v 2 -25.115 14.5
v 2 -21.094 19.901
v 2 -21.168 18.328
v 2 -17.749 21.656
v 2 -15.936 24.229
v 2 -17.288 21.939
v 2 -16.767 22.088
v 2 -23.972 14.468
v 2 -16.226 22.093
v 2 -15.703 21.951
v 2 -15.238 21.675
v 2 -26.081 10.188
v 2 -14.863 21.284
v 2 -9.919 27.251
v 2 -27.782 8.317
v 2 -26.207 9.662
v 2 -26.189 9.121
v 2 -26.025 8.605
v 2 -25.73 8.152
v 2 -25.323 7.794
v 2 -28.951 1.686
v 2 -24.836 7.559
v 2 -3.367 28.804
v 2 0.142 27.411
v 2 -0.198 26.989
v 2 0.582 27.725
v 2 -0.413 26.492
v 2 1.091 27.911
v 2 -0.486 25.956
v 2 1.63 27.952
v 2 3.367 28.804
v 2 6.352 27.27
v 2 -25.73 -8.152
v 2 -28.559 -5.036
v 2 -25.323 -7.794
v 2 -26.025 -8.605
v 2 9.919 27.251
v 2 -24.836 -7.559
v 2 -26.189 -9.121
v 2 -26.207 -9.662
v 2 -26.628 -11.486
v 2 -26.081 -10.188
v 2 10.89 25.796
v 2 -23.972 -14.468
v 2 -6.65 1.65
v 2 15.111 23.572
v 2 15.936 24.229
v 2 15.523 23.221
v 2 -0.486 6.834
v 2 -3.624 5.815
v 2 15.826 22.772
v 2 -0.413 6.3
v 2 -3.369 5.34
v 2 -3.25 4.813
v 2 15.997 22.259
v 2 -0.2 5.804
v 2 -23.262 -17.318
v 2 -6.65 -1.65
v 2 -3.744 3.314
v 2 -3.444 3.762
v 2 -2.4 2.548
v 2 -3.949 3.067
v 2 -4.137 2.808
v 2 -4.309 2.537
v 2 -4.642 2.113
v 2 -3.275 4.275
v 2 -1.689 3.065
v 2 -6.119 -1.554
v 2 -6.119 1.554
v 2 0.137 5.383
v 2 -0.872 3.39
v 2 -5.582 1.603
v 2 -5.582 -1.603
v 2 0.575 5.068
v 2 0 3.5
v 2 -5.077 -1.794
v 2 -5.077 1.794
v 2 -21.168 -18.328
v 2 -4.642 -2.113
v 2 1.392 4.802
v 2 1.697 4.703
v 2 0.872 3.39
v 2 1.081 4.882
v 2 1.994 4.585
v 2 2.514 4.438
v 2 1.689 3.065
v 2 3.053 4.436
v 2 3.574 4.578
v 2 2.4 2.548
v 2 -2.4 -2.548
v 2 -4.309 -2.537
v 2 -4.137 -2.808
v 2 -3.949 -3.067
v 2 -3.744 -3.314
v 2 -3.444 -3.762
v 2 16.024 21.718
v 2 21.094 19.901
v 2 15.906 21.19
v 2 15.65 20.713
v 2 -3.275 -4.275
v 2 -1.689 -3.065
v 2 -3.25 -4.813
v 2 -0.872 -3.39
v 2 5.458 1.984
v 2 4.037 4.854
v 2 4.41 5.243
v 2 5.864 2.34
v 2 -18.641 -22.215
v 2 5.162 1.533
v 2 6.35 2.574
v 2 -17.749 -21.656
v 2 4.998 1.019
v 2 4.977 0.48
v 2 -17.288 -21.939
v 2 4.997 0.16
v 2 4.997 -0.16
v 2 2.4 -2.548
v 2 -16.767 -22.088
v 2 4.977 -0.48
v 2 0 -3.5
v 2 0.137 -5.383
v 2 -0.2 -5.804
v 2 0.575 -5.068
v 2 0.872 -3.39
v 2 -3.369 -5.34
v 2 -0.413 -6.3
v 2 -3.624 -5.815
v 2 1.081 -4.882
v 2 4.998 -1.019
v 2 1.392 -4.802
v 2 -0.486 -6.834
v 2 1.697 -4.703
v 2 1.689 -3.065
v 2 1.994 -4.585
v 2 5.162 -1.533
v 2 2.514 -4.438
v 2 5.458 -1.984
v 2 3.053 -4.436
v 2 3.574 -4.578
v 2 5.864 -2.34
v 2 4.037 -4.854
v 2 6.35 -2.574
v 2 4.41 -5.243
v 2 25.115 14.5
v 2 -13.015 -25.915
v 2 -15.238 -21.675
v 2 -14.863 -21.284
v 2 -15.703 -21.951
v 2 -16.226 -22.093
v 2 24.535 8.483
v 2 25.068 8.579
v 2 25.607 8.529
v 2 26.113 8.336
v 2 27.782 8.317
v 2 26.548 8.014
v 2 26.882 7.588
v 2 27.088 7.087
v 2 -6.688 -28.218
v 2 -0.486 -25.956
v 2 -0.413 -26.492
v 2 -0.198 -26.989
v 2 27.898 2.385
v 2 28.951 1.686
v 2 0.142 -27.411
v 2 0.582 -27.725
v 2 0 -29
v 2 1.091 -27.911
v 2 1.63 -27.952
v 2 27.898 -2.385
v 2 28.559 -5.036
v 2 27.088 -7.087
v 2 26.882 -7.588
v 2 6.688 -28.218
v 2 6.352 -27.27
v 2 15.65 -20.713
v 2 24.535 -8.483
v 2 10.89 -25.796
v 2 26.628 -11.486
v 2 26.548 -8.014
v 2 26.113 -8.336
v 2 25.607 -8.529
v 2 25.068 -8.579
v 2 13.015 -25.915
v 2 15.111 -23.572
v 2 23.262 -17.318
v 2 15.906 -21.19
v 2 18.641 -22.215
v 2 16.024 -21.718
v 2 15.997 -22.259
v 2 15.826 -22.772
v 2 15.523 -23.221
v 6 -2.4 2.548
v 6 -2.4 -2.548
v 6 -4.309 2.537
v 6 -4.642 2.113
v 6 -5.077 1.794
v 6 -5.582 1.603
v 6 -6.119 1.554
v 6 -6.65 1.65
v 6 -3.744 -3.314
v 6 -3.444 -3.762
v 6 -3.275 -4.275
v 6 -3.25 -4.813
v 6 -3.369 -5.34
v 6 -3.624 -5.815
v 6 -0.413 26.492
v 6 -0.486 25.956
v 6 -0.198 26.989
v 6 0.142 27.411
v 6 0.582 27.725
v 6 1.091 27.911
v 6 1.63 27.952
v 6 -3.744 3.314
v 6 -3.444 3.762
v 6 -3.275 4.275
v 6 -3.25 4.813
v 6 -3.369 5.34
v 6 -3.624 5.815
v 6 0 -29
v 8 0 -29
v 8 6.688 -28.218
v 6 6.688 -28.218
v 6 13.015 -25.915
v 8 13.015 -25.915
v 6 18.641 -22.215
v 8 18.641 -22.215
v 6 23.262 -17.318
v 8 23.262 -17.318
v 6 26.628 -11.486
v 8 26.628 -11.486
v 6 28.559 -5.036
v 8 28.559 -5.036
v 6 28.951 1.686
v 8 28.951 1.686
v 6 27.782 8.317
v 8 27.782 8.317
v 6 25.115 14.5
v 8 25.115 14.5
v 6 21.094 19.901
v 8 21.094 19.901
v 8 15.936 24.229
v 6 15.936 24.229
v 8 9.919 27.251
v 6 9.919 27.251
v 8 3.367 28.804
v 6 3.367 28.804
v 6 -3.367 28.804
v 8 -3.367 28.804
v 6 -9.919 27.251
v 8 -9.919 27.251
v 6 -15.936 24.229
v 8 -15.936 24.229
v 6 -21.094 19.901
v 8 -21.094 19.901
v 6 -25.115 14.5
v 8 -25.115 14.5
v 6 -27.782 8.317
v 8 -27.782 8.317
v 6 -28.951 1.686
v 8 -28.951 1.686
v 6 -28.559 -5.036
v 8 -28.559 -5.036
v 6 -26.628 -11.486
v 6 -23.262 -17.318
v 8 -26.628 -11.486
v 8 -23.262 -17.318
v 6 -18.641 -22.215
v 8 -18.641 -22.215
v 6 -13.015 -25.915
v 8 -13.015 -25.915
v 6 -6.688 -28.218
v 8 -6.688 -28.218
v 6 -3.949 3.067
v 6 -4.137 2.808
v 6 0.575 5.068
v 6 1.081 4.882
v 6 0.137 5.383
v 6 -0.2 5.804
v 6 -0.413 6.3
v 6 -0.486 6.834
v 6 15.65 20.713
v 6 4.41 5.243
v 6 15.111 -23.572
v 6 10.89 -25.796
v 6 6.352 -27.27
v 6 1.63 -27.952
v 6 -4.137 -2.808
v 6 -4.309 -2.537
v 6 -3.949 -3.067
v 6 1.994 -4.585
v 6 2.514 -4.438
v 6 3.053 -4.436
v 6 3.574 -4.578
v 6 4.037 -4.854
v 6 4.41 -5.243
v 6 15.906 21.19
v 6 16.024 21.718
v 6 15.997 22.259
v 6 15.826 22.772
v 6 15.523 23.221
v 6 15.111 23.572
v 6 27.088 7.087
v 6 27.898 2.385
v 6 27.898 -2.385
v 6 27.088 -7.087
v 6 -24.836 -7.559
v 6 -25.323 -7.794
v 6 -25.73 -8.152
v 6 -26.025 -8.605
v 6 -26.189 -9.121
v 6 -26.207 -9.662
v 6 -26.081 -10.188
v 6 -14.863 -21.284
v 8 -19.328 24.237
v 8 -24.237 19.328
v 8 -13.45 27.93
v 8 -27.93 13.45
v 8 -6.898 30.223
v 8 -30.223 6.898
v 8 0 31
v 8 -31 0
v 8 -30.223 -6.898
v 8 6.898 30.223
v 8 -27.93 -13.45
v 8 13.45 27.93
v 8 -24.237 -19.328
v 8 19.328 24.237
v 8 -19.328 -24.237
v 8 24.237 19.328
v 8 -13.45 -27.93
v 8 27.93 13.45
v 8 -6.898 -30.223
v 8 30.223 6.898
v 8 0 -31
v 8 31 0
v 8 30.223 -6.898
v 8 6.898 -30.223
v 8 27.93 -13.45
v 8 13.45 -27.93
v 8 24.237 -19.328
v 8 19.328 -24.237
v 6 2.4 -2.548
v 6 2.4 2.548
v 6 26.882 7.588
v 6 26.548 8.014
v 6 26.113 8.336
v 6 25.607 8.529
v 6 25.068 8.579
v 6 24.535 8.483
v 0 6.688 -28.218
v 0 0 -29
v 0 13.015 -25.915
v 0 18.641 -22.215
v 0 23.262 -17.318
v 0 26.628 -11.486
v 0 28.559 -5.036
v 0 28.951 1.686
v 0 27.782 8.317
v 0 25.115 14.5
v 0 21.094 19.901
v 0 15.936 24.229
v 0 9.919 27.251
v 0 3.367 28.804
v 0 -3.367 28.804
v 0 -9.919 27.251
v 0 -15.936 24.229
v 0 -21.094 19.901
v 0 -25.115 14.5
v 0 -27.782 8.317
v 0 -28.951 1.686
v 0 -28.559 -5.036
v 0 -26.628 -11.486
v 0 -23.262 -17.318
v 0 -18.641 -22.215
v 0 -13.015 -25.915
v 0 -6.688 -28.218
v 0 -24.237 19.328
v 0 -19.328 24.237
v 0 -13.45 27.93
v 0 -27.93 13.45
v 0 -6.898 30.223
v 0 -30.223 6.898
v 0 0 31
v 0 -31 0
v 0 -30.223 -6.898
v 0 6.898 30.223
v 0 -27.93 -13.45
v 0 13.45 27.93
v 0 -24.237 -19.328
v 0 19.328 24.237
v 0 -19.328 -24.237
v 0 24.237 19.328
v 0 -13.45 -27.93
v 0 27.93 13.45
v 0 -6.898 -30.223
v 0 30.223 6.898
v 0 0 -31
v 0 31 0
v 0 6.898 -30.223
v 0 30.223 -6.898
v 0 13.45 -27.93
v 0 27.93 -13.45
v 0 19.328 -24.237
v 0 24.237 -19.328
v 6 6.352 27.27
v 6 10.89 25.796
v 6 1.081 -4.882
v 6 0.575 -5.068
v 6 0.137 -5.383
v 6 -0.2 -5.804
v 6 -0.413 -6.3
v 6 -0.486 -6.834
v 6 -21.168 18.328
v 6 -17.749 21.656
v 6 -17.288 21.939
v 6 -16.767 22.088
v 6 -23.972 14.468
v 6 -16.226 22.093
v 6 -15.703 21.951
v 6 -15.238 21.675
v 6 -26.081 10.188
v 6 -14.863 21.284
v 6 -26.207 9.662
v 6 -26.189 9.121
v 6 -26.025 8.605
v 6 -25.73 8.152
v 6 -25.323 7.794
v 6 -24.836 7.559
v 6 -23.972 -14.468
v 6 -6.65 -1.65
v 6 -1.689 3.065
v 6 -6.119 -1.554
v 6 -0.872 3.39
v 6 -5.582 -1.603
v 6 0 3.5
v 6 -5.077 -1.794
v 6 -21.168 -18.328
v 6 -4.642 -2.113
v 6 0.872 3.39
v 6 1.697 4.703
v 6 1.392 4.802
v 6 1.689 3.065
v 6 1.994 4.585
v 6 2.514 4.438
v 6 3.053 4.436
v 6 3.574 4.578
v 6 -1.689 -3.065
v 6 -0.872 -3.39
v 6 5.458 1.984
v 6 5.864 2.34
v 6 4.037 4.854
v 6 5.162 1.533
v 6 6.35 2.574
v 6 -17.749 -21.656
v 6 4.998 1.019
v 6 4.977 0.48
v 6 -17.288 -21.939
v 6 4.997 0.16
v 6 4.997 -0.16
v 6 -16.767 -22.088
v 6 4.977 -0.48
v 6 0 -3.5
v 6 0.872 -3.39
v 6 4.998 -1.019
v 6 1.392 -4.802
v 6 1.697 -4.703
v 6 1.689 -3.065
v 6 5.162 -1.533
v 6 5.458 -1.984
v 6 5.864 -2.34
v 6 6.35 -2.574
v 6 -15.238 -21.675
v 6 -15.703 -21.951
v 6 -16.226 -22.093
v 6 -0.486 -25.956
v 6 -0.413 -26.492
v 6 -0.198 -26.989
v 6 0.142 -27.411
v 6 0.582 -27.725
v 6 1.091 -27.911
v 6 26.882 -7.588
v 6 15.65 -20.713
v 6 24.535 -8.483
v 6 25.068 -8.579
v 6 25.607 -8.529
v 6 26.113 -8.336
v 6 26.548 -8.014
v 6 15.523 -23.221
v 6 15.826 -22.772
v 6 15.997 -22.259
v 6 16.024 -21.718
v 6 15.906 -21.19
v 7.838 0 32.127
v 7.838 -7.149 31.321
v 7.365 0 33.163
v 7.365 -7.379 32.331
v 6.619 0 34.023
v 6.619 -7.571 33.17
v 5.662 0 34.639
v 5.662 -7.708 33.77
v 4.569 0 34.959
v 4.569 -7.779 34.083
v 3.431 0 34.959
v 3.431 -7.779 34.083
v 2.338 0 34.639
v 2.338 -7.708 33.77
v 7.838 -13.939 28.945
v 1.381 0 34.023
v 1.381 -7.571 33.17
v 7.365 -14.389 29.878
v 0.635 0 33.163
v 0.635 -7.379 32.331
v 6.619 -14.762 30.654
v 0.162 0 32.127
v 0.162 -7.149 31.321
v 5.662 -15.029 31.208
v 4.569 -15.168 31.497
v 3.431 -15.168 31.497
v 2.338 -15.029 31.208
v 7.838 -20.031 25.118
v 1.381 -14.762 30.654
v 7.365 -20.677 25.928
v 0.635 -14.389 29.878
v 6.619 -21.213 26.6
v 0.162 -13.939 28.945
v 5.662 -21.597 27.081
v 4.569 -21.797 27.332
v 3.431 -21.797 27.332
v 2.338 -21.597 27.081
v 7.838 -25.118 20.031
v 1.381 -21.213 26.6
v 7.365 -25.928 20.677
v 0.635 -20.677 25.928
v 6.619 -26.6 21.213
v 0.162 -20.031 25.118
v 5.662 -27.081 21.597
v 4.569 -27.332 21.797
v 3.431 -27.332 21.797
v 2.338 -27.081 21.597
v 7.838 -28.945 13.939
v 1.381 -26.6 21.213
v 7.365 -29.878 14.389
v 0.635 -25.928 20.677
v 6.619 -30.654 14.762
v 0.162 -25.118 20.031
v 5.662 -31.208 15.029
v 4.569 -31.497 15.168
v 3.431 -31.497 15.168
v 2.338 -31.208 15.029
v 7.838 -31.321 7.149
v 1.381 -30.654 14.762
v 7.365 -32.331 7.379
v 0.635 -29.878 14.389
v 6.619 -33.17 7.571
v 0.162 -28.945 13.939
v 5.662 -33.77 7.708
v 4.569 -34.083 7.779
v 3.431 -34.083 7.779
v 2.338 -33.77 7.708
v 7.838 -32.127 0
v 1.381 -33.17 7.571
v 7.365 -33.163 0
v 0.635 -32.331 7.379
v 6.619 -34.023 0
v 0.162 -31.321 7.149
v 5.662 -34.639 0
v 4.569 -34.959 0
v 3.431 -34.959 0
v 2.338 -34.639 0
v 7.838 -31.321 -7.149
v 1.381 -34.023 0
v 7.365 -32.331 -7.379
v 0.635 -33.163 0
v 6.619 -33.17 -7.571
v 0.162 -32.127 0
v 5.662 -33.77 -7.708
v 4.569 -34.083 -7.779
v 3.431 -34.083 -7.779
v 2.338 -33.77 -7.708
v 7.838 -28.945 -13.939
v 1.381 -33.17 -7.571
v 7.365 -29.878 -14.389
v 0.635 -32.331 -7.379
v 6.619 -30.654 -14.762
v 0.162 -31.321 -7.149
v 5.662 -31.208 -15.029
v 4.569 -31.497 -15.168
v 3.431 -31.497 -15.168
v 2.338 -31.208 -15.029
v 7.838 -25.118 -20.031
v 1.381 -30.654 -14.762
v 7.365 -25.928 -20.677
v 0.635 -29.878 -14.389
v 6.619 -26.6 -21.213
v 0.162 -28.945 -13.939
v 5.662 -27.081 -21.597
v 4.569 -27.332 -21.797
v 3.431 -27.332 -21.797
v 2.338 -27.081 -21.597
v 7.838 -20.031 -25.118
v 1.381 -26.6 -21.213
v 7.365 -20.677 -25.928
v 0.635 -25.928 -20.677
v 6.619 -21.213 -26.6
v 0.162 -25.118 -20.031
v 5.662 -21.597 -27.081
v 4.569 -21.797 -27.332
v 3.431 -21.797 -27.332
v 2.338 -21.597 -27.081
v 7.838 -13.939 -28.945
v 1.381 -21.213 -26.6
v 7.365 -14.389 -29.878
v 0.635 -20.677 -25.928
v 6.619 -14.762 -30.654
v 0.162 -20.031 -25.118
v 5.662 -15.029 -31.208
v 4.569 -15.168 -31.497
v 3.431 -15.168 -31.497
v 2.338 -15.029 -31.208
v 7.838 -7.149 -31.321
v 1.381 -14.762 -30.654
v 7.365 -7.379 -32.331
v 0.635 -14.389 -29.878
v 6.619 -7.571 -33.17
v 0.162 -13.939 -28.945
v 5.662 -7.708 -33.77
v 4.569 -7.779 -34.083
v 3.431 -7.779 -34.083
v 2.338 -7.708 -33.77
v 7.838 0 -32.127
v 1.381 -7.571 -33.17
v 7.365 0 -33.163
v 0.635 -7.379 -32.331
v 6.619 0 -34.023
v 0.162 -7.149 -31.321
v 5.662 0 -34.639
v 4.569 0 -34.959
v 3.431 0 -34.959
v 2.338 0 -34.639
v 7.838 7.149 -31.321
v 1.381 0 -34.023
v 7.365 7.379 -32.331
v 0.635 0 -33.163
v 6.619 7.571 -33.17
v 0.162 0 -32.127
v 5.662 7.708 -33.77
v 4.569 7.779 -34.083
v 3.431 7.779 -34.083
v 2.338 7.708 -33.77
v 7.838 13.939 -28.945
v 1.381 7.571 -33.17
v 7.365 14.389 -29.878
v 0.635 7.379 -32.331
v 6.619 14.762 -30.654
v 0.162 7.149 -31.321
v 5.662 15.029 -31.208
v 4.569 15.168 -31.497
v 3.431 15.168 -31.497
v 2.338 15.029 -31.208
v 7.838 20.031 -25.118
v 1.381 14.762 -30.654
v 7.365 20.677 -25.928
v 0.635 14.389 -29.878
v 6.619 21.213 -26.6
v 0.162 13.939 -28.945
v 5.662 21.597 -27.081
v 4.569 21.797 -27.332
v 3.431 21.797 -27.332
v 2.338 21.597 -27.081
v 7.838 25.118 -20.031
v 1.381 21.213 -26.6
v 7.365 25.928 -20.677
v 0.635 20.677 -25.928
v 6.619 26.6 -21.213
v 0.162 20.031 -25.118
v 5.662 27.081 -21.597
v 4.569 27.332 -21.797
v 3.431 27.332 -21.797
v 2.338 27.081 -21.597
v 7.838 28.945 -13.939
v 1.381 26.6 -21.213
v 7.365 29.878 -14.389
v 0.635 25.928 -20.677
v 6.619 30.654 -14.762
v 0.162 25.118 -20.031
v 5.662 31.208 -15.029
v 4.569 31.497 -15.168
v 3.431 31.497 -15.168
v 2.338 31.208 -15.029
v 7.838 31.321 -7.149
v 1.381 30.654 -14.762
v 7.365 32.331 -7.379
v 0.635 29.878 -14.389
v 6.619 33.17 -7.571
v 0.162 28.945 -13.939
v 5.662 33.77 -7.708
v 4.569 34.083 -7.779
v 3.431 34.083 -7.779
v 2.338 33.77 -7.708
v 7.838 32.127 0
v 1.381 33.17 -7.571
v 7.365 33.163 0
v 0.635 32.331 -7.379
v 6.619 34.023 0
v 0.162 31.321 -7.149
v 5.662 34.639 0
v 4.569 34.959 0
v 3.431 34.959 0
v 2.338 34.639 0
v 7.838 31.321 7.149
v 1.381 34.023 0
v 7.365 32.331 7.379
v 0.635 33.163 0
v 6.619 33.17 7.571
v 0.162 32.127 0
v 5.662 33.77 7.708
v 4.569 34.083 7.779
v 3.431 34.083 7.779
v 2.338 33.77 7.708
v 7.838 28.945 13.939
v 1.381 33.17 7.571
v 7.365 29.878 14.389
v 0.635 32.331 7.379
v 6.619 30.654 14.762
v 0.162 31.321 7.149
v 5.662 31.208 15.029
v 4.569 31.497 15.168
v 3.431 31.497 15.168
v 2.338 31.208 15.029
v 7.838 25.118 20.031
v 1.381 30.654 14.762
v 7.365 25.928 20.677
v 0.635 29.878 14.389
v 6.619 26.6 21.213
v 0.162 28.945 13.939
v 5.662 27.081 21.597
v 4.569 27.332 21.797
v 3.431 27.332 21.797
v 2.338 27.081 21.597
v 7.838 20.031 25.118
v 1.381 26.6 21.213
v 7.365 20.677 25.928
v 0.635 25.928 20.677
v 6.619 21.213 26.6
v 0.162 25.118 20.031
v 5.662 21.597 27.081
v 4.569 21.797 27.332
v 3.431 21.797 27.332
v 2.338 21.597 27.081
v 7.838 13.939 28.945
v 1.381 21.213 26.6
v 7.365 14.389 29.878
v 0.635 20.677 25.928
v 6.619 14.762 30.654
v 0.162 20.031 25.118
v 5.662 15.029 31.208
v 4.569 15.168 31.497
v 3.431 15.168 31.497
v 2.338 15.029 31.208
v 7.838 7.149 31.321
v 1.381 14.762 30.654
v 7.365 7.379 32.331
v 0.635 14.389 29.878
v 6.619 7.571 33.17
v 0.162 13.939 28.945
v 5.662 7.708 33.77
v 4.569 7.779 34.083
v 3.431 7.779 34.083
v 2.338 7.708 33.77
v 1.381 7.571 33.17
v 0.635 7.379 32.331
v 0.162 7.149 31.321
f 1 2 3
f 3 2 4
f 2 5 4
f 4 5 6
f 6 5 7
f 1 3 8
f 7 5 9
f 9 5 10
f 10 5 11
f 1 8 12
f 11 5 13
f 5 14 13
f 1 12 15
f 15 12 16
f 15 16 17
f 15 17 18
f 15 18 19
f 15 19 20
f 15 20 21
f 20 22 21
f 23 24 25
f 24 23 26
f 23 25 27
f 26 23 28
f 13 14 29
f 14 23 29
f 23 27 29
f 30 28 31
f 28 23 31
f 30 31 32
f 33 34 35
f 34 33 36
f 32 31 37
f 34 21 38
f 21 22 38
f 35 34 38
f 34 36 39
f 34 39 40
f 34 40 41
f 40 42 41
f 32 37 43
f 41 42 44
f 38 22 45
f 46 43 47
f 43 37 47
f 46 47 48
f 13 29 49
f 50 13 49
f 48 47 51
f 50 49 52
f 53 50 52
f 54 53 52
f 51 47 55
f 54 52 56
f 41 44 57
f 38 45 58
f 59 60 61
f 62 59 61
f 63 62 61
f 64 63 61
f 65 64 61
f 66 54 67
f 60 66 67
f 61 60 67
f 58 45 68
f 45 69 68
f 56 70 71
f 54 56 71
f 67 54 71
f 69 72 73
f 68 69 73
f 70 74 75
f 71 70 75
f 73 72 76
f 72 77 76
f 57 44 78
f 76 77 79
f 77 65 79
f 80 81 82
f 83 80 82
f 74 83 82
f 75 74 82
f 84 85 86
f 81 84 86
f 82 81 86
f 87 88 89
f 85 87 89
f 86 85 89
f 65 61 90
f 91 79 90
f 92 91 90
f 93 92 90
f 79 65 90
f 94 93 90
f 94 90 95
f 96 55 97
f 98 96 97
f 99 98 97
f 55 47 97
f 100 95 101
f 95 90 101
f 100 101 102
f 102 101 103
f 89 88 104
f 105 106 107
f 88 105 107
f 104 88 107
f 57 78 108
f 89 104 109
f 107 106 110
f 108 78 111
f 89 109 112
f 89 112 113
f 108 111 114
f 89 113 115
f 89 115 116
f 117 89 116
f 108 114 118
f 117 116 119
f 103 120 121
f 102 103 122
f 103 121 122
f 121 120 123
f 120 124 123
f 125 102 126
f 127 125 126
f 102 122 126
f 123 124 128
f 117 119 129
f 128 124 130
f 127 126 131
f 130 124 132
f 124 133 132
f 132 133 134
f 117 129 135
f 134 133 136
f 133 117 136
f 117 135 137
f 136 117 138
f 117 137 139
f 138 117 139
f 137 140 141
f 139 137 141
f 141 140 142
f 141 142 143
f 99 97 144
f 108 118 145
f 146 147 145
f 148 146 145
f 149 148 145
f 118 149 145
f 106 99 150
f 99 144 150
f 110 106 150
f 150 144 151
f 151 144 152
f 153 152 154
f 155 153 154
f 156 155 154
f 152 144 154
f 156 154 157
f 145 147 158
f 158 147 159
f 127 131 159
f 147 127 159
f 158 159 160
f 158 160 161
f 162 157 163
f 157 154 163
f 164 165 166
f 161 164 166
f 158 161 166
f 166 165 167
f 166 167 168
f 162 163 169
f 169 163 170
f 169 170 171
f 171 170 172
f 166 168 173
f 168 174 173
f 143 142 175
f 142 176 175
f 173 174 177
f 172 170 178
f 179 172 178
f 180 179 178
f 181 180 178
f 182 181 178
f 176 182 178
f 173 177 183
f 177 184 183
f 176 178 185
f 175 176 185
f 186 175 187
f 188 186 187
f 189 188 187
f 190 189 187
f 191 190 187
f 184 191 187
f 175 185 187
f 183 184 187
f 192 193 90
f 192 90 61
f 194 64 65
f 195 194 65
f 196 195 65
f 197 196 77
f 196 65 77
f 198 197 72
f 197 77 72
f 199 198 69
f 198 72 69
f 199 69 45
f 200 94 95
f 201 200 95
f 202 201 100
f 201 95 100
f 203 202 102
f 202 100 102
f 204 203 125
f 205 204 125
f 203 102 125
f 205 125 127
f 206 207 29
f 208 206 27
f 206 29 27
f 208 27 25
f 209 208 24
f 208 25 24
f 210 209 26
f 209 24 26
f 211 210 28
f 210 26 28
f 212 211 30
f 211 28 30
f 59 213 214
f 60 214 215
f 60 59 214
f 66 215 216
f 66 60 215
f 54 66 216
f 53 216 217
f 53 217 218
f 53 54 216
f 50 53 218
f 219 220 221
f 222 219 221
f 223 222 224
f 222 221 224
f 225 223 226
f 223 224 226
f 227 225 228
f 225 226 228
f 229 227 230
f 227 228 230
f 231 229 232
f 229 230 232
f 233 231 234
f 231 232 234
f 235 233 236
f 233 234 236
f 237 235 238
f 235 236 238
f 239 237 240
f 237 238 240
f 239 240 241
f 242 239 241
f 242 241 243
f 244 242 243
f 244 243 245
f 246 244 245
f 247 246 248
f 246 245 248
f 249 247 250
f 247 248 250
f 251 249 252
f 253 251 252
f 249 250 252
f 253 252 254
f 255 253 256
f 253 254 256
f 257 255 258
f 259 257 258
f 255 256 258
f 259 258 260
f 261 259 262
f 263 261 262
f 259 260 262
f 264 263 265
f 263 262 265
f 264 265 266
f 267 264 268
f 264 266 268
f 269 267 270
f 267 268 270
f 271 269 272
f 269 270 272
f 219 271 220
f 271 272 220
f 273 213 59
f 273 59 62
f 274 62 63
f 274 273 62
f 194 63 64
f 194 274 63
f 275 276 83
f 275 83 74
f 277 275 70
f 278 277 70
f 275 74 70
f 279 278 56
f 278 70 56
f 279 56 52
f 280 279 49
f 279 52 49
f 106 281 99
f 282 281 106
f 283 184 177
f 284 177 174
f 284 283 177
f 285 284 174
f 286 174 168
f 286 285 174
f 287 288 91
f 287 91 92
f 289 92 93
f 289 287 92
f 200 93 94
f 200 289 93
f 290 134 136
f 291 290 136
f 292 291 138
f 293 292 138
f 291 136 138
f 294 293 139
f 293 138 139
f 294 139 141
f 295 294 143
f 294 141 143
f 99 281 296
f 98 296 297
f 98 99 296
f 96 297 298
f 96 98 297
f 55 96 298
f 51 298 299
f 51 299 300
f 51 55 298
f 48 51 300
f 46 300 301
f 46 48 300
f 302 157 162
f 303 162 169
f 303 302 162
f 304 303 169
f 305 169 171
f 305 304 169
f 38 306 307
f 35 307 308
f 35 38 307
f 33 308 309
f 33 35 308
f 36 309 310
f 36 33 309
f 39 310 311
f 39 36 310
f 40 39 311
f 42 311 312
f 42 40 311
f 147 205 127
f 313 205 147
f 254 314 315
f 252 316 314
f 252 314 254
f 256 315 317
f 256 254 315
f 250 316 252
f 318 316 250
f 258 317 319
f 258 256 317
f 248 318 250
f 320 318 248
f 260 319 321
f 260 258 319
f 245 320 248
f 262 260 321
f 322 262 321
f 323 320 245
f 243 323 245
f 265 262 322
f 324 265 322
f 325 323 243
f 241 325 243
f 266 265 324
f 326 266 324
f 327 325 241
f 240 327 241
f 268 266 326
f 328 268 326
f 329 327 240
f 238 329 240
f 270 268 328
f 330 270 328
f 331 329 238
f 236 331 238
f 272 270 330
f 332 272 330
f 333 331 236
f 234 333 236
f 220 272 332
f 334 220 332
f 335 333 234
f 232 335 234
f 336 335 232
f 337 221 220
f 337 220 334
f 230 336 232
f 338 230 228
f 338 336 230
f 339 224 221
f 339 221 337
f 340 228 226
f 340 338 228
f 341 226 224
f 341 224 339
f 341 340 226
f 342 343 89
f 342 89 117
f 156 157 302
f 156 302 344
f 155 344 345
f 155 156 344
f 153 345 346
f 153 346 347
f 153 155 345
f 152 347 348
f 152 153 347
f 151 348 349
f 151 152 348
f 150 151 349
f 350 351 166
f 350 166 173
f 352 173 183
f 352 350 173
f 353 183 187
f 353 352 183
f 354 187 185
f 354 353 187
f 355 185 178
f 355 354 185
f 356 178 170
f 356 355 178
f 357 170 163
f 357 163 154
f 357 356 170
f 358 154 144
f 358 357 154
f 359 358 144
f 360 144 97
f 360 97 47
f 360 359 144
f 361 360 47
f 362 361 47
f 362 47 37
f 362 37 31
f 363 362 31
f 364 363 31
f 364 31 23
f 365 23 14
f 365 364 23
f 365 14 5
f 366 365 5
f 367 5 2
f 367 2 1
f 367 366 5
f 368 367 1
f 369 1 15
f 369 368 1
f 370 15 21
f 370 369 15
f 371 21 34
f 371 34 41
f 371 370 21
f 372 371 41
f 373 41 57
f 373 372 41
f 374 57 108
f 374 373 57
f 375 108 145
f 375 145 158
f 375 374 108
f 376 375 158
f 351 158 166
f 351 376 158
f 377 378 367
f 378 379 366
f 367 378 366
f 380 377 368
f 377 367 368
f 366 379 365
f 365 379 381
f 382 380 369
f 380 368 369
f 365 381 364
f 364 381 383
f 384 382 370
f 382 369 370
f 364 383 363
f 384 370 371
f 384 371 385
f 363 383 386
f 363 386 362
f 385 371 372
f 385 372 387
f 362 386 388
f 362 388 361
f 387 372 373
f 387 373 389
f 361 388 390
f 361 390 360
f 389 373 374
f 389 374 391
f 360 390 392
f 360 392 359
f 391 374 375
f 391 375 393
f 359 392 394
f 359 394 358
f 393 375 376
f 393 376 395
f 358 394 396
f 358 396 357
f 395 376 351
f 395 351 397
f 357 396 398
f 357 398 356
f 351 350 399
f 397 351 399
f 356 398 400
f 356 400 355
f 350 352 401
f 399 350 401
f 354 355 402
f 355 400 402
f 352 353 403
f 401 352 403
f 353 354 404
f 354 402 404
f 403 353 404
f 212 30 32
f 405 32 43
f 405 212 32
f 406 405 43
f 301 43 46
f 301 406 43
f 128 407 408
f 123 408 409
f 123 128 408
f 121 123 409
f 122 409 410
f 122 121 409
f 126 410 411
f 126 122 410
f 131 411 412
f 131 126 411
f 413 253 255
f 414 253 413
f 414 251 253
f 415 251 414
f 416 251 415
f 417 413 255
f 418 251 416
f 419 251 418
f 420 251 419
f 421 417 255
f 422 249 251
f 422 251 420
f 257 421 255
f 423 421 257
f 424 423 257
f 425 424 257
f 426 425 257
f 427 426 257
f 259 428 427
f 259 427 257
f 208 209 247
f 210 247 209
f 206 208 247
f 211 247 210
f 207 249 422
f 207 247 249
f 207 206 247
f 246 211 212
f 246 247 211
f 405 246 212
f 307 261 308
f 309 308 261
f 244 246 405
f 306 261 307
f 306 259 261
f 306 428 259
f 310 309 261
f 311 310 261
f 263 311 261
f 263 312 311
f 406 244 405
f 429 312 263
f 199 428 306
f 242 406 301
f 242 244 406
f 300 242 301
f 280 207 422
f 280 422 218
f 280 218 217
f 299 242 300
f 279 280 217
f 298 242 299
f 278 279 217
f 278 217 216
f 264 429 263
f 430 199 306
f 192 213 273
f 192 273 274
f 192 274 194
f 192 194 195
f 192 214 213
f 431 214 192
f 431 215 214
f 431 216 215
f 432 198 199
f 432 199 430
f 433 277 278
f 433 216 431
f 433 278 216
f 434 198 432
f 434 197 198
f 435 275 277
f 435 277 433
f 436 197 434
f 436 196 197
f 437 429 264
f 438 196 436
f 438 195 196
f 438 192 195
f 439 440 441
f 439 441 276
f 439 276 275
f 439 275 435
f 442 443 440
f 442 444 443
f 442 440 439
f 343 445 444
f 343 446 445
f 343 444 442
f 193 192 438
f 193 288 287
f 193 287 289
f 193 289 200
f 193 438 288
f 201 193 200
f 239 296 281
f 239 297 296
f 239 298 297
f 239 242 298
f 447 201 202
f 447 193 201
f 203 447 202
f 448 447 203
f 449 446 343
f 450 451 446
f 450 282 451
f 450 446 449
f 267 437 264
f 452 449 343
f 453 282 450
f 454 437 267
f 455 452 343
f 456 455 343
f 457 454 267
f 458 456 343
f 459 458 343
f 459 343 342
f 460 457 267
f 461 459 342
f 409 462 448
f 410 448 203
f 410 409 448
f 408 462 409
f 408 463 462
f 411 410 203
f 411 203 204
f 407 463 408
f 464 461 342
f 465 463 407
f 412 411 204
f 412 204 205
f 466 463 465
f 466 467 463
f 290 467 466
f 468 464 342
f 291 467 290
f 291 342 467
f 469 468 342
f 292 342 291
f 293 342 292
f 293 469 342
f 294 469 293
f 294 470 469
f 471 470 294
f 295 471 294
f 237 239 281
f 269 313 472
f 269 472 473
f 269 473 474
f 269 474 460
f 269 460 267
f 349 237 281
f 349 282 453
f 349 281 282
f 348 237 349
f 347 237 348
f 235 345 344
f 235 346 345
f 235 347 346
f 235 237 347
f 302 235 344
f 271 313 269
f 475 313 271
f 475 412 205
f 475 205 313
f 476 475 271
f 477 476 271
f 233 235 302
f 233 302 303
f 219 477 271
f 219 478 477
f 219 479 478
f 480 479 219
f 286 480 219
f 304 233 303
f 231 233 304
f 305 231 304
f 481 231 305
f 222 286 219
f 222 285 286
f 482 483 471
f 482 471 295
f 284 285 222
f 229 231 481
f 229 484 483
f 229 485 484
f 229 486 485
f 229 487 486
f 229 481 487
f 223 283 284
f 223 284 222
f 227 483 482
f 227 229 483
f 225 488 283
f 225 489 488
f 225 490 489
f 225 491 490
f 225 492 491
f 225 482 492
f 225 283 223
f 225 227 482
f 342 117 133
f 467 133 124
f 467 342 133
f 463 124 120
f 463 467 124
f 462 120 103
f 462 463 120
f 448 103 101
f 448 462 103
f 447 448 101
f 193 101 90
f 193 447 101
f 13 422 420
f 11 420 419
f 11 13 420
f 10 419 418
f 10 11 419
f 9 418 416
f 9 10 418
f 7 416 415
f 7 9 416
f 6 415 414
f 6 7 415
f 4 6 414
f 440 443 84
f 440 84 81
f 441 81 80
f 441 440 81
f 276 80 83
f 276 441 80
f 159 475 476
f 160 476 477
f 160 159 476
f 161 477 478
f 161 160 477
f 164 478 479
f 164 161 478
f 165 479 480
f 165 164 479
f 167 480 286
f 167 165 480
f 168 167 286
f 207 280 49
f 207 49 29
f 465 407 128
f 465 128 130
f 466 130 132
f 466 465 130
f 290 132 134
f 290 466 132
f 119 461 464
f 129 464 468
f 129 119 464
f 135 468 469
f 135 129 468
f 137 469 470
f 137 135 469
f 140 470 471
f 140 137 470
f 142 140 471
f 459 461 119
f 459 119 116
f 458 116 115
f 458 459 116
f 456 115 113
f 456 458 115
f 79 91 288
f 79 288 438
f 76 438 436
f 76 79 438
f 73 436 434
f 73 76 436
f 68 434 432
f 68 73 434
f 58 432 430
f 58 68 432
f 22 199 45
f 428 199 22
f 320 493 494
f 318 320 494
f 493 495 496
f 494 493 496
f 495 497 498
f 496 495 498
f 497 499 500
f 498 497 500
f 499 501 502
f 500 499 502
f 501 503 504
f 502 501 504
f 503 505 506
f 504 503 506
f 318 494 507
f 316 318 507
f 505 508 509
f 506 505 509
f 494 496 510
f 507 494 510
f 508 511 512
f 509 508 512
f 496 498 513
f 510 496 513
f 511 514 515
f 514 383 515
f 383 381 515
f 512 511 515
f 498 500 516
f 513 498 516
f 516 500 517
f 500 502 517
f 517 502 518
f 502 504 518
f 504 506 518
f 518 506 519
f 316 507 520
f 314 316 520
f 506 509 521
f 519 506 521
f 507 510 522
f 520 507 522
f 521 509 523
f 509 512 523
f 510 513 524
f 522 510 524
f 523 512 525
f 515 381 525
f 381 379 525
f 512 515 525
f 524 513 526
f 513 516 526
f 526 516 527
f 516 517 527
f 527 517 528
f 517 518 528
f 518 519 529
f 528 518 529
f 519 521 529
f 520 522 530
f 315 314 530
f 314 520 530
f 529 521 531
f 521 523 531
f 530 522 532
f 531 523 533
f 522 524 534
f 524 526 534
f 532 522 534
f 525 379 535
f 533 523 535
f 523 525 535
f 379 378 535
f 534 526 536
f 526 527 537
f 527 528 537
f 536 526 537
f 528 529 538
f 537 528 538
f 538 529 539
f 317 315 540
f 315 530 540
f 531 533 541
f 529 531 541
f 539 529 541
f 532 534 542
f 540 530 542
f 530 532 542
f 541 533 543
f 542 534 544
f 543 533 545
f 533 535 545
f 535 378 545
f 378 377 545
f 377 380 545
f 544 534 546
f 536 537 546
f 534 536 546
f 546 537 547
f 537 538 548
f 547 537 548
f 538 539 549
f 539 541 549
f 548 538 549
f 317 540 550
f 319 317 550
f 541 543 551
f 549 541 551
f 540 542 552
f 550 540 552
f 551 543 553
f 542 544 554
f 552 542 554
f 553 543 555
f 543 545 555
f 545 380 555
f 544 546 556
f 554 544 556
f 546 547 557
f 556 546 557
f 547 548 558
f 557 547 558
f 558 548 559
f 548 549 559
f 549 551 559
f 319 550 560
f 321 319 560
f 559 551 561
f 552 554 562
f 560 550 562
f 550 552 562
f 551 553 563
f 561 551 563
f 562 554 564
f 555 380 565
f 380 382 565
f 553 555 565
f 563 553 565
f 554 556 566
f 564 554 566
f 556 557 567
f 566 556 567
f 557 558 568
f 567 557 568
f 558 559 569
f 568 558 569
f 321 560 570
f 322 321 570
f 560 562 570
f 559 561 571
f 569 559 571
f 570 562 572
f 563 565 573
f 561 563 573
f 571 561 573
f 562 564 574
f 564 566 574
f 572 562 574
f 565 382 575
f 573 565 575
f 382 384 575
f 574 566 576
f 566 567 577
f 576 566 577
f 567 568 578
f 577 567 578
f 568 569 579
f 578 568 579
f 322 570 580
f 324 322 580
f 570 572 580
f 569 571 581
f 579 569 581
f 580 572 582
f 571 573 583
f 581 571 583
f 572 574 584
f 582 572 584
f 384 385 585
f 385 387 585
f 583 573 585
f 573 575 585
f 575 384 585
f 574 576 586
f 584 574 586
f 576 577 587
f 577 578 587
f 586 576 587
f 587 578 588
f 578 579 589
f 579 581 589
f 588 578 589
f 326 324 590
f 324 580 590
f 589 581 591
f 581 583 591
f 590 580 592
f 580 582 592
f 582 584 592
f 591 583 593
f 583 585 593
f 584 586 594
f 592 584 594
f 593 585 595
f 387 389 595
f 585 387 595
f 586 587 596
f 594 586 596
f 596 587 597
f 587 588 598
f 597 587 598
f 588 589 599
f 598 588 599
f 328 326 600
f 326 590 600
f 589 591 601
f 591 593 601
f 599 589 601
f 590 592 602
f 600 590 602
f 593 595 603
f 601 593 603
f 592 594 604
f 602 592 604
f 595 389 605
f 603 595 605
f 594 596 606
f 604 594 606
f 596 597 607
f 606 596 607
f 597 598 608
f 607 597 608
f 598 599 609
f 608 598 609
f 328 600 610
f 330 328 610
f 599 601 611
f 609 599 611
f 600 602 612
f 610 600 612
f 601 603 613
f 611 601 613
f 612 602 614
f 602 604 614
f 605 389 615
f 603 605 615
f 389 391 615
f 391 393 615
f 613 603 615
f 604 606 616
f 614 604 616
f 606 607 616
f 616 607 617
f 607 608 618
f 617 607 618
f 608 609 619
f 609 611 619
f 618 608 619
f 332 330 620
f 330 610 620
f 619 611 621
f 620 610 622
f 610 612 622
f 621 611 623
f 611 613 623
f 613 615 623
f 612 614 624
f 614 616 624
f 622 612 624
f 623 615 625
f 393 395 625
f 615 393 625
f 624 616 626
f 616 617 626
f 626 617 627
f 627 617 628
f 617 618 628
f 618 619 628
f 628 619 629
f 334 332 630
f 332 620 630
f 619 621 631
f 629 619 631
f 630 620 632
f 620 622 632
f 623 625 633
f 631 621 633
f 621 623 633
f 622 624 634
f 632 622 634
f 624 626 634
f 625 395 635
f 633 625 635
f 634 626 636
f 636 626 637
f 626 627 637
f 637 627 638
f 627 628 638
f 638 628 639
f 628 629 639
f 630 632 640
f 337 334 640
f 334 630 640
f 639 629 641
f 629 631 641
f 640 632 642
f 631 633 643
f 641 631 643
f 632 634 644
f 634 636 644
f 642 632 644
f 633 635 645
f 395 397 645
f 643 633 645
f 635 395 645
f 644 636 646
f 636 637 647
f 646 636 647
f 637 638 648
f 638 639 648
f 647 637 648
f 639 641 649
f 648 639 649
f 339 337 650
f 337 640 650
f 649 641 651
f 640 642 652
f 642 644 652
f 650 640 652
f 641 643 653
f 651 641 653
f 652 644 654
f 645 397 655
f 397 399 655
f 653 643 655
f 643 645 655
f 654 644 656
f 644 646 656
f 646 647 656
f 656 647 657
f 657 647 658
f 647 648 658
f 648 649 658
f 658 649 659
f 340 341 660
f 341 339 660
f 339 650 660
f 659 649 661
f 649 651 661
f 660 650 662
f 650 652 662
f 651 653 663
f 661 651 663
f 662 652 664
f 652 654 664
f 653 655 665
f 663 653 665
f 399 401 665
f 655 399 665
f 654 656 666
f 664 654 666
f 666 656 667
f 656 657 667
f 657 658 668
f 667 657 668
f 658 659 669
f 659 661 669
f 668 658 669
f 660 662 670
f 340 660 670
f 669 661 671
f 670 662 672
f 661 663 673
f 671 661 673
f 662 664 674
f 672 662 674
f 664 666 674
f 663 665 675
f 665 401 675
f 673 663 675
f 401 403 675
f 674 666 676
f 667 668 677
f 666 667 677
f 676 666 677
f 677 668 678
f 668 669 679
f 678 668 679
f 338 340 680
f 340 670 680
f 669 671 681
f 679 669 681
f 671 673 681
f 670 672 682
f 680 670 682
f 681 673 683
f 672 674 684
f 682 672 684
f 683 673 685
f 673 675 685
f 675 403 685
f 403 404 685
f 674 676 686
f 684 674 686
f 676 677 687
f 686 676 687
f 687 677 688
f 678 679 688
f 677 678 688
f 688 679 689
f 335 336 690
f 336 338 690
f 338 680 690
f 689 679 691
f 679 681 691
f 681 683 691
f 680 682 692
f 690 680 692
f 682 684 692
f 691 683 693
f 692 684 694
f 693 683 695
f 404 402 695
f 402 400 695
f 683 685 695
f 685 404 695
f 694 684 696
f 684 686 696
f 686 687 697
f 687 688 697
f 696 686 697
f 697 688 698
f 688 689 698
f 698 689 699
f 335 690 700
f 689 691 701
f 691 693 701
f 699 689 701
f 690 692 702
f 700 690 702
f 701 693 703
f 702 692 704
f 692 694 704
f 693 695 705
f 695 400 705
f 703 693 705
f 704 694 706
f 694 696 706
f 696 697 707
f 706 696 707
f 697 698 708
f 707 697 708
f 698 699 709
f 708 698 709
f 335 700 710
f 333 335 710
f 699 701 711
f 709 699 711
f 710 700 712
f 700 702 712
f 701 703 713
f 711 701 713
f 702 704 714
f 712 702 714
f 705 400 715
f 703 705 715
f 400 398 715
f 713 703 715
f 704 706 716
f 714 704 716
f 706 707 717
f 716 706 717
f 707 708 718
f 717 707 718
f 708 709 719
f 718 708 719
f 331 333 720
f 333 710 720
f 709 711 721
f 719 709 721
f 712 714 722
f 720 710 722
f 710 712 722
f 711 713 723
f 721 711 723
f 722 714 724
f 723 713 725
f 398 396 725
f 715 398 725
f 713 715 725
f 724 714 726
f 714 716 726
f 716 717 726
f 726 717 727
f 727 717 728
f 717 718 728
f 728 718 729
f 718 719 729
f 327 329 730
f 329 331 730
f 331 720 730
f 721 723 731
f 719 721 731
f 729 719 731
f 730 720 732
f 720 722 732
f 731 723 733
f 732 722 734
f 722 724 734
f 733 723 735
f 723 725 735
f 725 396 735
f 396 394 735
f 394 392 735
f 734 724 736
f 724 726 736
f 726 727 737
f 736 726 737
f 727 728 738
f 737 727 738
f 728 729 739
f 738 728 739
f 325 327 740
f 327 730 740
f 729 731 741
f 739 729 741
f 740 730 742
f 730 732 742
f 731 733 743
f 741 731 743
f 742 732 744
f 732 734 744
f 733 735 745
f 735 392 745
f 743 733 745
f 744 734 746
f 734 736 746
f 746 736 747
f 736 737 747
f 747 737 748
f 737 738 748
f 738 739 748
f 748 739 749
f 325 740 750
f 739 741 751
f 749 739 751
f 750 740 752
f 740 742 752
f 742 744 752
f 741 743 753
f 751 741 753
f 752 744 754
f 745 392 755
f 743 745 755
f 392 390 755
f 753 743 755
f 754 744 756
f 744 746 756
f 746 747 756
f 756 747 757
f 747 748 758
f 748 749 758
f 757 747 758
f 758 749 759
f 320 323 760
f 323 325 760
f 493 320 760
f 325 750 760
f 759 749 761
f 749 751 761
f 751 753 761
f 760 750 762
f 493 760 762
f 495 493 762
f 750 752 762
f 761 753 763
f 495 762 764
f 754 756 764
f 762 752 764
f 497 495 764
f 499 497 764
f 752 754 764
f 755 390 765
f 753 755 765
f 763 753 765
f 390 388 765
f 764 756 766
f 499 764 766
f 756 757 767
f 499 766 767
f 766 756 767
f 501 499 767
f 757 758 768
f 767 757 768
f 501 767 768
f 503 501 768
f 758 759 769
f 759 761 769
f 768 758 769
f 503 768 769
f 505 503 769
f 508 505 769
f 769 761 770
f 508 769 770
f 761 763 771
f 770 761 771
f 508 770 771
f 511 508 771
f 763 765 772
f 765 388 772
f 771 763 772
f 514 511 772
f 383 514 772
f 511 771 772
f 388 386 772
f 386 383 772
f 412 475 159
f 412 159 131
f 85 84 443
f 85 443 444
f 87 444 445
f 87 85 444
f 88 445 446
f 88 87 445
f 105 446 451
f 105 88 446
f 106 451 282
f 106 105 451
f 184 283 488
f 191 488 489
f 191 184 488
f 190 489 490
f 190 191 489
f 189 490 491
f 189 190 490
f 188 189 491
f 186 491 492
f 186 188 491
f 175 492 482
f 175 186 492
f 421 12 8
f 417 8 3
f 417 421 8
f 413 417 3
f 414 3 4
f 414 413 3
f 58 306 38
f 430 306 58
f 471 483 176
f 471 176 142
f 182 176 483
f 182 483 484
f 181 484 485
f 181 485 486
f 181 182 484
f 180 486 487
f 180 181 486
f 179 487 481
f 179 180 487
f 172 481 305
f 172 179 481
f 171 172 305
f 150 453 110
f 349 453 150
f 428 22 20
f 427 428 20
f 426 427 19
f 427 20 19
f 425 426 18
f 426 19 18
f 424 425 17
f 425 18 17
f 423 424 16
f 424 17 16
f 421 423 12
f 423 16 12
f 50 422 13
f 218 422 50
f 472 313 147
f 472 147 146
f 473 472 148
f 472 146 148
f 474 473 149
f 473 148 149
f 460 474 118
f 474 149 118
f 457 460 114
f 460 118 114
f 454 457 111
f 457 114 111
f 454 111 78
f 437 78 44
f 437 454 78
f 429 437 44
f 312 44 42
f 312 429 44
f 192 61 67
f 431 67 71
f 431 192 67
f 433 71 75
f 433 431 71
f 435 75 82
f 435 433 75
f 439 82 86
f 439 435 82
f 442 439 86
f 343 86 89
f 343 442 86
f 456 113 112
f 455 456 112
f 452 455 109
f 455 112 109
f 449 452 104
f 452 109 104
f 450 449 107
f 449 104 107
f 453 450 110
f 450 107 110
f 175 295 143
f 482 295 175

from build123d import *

# Parameters (mm, degrees)
SKETCH1_R                = 31
BOSS_EXTRUDE1_DEPTH      = 8
SKETCH3_R                = 29
CUT_EXTRUDE1_DEPTH       = 2
CUT_EXTRUDE2_DEPTH       = 45.24929378
FILLET2_R                = 2
CIRPATTERN1_COUNT        = 5
FILLET2_OF_CIRPATTERN1_R = 2
CUT_EXTRUDE3_REACH       = 46.249


with BuildPart() as part:
    # Sketch1 → Boss-Extrude1 (new body)
    with BuildSketch(Plane(origin=(0, 0, 0), x_dir=(0, 0, -1), z_dir=(1, 0, 0))):
        Circle(SKETCH1_R)
    extrude(amount=BOSS_EXTRUDE1_DEPTH)

    # Sketch3 → Cut-Extrude1 (cut)
    with BuildSketch(Plane(origin=(8, 0, 0), x_dir=(0, 0, -1), z_dir=(1, 0, 0))):
        Circle(SKETCH3_R)
    cut_extrude1 = extrude(amount=-CUT_EXTRUDE1_DEPTH, mode=Mode.SUBTRACT)

    # Sketch4 → Cut-Extrude2 (cut, through all)
    with BuildSketch(Plane(origin=(6, 0, 0), x_dir=(0, 0, -1), z_dir=(1, 0, 0))):
        with BuildLine():
            Line((-2, 4.582575695), (-9.113404062, 26.475382271))
            ThreePointArc((-9.113404062, 26.475382271), (0, 28), (9.113404062, 26.475382271))
            Line((9.113404062, 26.475382271), (2, 4.582575695))
            ThreePointArc((2, 4.582575695), (0, 5), (-2, 4.582575695))
        make_face()
    cut_extrude2 = extrude(amount=-CUT_EXTRUDE2_DEPTH, mode=Mode.SUBTRACT)

    # Fillet2
    fillet2_edges = [part.edges().sort_by_distance(p)[0] for p in [
        (3, 4.582575695, -2),
        (3, 4.582575695, 2),
        (3, 26.475382271, 9.113404062),
        (3, 26.475382271, -9.113404062),
    ]]
    fillet(fillet2_edges, radius=FILLET2_R)

    # CirPattern1: Cut-Extrude2 ×5 about axis
    cirpattern1_axis = Axis((0, 0, 0), (1, 0, 0))
    for i in range(1, CIRPATTERN1_COUNT):
        add(cut_extrude2.rotate(cirpattern1_axis, i * 360 / CIRPATTERN1_COUNT), mode=Mode.SUBTRACT)

    # Fillet2 of CirPattern1
    fillet2_of_cirpattern1_edges = [part.edges().sort_by_distance(p)[0] for p in [
        (3, 3.3182068, 3.740254487),
        (3, -0.486019265, 4.976322465),
        (3, -0.486019265, 27.995781562),
        (3, 16.848705373, 22.363388098),
        (3, -2.531811111, 4.3116044),
        (3, -4.88295212, 1.075536422),
        (3, -26.775758696, 8.188940485),
        (3, -16.062309684, 22.934738011),
        (3, -4.88295212, -1.075536422),
        (3, -2.531811111, -4.3116044),
        (3, -16.062309684, -22.934738011),
        (3, -26.775758696, -8.188940485),
        (3, -0.486019265, -4.976322465),
        (3, 3.3182068, -3.740254487),
        (3, 16.848705373, -22.363388098),
        (3, -0.486019265, -27.995781562),
    ]]
    fillet(fillet2_of_cirpattern1_edges, radius=FILLET2_OF_CIRPATTERN1_R)

    # Mirror1: Cut-Extrude1 across plane
    add(cut_extrude1.mirror(Plane(origin=(4, 0, 0), x_dir=(0, 0, 1), z_dir=(1, 0, 0))), mode=Mode.SUBTRACT)

    # Sketch5 → Cut-Extrude3 (cut, up to next)
    with BuildSketch(Plane(origin=(6, 0, 0), x_dir=(0, 0, -1), z_dir=(1, 0, 0)), mode=Mode.PRIVATE) as cut_extrude3_sk1:
        with BuildLine():
            Line((-2.547547841, 2.4), (2.547547841, 2.4))
            ThreePointArc((2.547547841, 2.4), (3.5, 0), (2.547547841, -2.4))
            Line((2.547547841, -2.4), (-2.547547841, -2.4))
            ThreePointArc((-2.547547841, -2.4), (-3.5, 0), (-2.547547841, 2.4))
        make_face()
    cut_extrude3_tool1 = extrude(cut_extrude3_sk1.sketch, amount=-CUT_EXTRUDE3_REACH, mode=Mode.PRIVATE) & part.part
    add(cut_extrude3_tool1.solids().sort_by_distance((6, 0, 0))[0], mode=Mode.SUBTRACT)

    # Sketch6 → Revolve1 (revolve)
    with BuildSketch(Plane.XY, mode=Mode.PRIVATE) as revolve1_sk:
        with BuildLine():
            Line((0, 31), (8, 31))
            ThreePointArc((8, 31), (4, 35), (0, 31))
        make_face()
    revolve(revolve1_sk.sketch.rotate(Axis((-0.381, 0, 0), (1, 0, 0)), 90), axis=Axis((-0.381, 0, 0), (1, 0, 0)))


solid = part.part
